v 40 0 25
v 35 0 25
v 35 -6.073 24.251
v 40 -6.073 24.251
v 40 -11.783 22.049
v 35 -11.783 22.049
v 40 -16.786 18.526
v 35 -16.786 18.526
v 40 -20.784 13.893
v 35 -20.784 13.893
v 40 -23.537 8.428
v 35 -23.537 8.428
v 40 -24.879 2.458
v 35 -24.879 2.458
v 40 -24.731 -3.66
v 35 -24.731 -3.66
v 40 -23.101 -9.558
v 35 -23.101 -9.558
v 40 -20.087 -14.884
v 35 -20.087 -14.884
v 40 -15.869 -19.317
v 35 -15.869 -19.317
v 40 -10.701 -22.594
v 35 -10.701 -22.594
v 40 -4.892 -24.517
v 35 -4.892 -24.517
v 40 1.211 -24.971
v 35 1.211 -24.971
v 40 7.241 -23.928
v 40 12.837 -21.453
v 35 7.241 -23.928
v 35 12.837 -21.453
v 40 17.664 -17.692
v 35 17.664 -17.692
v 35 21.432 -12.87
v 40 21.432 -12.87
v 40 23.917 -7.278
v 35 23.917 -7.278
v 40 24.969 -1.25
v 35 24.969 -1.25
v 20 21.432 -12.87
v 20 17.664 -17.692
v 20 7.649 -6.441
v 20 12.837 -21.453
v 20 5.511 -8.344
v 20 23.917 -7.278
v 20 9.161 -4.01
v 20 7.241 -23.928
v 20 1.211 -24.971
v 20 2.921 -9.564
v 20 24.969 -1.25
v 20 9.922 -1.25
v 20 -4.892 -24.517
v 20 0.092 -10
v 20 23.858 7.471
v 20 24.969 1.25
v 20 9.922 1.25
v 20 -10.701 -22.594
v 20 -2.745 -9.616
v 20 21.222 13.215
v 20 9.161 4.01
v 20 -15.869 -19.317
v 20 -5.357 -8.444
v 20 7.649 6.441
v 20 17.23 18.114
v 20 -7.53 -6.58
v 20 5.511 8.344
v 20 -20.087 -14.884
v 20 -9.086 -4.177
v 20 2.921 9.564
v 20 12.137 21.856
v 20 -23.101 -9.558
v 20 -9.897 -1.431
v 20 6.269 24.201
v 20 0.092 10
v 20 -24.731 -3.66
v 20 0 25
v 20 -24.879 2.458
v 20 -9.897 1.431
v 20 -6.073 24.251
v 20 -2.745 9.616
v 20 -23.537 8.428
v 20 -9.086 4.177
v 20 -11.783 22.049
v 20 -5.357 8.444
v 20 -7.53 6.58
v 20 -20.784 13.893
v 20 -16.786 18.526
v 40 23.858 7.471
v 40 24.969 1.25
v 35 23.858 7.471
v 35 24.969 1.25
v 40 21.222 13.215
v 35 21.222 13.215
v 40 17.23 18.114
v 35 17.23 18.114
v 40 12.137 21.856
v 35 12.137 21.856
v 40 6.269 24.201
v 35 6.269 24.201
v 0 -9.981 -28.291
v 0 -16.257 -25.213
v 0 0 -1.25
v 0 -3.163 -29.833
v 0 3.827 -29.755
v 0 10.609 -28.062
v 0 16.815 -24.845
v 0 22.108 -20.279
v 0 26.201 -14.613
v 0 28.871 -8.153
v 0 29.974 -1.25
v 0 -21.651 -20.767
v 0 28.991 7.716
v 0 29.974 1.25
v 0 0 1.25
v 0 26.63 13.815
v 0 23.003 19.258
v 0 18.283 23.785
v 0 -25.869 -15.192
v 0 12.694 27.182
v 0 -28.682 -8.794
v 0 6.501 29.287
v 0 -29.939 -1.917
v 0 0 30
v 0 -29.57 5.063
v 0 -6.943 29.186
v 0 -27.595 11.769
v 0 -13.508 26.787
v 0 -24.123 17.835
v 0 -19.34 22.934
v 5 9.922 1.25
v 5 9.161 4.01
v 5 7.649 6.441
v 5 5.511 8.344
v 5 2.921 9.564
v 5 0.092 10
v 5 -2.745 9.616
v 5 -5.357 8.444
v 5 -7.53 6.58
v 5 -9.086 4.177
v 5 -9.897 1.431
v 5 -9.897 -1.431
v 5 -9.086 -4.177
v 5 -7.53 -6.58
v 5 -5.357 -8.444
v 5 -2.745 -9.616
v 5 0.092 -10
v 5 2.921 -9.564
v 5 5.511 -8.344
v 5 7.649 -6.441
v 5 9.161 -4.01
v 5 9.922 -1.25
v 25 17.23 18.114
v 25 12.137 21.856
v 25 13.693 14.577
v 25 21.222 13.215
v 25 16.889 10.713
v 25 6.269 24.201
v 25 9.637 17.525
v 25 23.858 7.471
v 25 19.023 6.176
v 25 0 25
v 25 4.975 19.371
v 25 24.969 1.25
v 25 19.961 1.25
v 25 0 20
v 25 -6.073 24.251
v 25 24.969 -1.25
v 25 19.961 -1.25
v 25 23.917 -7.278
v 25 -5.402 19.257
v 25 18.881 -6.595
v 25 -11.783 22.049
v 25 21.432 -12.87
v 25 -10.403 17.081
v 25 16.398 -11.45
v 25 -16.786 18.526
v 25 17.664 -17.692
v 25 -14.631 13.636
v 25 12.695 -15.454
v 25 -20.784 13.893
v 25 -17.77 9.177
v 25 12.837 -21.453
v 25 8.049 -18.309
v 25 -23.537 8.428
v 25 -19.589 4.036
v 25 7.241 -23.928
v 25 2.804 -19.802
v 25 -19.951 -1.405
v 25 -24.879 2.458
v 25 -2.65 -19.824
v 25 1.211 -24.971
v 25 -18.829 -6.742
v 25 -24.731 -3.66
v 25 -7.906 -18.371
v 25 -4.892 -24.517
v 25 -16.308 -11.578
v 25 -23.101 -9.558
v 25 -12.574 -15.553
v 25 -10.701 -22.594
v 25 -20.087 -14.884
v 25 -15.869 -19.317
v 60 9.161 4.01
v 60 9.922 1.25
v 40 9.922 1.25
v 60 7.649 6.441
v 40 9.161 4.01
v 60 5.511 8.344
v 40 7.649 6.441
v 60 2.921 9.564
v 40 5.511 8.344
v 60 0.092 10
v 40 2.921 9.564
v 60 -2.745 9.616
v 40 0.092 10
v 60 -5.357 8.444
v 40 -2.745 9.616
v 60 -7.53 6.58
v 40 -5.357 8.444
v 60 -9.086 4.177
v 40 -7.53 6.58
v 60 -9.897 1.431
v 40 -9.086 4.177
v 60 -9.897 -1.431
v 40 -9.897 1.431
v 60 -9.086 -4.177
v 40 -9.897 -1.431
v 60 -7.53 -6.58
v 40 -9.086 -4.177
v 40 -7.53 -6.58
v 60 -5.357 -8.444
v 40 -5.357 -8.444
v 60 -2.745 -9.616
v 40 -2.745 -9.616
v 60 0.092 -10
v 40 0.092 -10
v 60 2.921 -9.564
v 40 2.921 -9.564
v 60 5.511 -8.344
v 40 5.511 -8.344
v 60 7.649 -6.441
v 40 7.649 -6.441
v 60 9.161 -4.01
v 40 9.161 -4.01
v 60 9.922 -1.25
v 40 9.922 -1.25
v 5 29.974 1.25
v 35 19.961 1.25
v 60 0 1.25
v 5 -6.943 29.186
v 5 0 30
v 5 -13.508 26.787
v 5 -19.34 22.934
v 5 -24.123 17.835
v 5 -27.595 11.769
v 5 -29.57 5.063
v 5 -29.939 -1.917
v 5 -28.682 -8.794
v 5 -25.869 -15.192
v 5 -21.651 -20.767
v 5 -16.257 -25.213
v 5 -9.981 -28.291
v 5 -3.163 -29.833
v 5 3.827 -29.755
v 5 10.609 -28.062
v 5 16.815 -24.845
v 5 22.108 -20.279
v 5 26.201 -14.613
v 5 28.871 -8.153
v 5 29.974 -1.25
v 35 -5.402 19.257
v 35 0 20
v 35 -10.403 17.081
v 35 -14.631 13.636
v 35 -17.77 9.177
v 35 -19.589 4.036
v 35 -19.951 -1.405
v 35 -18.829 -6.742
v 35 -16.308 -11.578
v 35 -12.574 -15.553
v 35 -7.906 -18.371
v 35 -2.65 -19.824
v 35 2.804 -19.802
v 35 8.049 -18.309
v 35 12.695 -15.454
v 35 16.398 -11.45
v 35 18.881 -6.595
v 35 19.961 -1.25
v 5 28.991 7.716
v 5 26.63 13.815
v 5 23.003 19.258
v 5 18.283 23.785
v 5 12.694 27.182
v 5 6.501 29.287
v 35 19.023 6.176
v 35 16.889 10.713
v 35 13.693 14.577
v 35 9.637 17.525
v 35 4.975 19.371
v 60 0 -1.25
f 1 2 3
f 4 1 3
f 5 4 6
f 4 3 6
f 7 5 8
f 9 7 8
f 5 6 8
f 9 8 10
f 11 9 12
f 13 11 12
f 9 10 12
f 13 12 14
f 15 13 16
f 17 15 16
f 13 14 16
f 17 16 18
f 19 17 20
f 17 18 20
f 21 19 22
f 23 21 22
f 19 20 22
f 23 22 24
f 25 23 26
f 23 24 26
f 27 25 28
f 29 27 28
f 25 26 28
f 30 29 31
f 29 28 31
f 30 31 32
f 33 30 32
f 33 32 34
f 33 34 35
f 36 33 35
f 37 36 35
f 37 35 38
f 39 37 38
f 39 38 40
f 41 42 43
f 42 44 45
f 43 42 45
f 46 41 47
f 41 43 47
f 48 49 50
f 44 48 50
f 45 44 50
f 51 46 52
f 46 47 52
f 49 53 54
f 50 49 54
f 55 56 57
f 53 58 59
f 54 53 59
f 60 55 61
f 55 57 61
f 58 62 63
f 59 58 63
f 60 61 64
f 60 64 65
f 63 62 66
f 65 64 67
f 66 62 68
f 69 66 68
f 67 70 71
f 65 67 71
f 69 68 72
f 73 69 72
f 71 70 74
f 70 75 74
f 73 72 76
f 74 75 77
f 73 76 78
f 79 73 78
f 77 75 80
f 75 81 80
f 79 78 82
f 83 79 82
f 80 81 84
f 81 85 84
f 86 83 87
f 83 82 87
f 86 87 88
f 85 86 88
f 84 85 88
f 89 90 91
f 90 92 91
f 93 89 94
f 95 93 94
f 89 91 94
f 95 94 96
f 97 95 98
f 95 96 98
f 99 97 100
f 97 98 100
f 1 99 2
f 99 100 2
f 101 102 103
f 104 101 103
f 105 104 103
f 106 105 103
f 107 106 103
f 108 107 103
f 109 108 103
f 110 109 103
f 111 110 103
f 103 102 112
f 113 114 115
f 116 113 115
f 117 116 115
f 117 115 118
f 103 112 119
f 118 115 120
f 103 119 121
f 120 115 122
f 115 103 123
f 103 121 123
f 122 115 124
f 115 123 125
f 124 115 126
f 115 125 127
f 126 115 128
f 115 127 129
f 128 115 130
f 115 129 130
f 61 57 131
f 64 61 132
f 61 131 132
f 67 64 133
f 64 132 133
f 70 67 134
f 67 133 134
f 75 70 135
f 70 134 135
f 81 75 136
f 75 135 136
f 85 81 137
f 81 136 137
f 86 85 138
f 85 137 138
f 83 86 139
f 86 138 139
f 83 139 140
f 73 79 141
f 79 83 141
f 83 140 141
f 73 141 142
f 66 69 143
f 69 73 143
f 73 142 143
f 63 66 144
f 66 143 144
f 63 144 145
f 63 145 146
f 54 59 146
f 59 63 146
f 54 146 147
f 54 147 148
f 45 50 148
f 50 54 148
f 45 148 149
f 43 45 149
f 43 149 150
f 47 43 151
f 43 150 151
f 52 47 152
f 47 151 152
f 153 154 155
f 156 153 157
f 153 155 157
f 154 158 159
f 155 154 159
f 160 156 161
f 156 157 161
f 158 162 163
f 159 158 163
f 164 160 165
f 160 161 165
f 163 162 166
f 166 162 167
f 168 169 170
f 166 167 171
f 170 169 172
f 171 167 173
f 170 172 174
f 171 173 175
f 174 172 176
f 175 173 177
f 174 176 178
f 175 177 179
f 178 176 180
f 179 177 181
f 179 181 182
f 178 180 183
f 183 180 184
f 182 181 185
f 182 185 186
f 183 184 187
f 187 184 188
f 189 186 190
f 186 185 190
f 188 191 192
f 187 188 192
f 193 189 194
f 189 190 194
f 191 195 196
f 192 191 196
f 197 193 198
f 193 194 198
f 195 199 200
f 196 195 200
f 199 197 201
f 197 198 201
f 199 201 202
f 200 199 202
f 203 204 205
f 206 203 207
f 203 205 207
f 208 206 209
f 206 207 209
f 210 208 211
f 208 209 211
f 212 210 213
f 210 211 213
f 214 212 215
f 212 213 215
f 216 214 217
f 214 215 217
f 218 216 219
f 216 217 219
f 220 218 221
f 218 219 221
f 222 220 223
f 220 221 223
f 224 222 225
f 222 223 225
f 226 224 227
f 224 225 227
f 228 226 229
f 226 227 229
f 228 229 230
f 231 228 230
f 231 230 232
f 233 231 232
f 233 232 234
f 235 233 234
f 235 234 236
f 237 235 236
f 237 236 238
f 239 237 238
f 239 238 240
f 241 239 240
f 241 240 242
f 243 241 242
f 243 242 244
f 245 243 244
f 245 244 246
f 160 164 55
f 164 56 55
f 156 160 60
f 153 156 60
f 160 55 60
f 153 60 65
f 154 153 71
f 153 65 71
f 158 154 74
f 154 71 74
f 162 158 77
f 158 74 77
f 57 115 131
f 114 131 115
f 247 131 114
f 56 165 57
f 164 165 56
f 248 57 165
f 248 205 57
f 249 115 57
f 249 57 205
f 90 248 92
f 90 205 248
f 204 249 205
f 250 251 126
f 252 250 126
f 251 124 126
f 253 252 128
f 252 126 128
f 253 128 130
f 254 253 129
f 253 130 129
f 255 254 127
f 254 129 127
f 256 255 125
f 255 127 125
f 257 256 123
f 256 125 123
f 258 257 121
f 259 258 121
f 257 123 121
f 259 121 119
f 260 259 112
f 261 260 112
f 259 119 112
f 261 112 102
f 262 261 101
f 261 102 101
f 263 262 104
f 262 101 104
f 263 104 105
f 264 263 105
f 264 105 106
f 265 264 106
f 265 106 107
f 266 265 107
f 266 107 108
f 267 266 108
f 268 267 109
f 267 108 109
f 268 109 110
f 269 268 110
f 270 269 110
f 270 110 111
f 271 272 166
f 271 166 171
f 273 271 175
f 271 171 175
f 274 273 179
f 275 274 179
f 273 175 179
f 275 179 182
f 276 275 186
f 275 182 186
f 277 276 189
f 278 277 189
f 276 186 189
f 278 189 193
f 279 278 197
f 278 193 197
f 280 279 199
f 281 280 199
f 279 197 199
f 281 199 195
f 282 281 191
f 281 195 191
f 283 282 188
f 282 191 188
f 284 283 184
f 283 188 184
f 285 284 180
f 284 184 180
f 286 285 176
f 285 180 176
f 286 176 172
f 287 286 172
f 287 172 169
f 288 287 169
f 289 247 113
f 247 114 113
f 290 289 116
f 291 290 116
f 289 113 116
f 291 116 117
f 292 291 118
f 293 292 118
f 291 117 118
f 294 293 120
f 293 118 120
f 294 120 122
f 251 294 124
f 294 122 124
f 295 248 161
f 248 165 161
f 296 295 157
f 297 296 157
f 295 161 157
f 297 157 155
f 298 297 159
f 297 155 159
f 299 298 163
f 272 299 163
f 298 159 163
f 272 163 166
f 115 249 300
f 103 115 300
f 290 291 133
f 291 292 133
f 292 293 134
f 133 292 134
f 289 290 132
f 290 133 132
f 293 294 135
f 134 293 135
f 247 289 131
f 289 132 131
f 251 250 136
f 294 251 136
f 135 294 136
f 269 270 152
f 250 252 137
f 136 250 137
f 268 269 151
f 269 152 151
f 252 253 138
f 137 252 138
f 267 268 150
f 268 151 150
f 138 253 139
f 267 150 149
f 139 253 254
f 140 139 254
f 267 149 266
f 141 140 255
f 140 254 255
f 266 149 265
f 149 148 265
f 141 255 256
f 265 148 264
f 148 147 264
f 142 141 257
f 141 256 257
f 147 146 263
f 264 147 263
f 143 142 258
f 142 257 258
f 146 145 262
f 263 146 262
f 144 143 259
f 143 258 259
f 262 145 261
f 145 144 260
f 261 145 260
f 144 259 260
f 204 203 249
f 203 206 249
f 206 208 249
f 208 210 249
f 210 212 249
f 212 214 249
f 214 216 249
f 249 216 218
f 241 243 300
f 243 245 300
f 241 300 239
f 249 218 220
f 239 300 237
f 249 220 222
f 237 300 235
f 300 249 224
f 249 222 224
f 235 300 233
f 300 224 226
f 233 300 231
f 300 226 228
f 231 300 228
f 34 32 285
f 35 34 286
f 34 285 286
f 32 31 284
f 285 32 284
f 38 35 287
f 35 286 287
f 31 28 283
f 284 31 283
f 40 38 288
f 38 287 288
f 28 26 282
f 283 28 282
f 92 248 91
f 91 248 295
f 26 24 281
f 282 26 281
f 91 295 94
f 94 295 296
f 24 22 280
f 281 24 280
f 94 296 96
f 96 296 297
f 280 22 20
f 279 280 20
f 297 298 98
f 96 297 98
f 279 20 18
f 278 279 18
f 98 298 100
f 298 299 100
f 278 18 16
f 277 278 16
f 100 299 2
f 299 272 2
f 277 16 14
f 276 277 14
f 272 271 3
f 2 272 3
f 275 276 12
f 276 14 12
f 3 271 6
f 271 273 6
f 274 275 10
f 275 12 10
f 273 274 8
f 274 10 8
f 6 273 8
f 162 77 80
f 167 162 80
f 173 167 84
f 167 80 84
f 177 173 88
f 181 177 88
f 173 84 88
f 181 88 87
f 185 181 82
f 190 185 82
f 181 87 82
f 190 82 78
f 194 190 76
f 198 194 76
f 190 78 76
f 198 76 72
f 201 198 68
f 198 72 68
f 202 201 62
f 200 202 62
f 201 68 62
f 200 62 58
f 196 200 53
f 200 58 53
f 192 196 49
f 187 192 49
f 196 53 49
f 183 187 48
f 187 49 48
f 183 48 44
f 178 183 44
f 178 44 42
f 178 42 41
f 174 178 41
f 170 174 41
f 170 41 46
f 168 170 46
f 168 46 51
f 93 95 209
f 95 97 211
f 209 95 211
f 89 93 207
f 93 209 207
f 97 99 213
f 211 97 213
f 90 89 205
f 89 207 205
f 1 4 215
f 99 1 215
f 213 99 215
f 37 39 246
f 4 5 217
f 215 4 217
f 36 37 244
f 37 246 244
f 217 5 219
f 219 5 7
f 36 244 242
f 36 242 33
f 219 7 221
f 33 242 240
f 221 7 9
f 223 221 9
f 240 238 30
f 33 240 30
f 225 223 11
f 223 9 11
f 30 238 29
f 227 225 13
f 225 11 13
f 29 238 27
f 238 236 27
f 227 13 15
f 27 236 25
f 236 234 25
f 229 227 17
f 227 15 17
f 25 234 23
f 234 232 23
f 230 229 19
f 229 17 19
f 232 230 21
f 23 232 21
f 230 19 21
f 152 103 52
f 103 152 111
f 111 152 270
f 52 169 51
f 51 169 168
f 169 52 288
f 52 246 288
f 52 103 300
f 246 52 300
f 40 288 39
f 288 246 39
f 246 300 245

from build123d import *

# Parameters (mm, degrees)
SKETCH2_W          = 2.5
SKETCH2_H          = 34.957041577
CUT_EXTRUDE1_DEPTH = 74.484692283


with BuildPart() as part:
    # Sketch1 → Revolve1 (revolve)
    with BuildSketch(Plane.XY, mode=Mode.PRIVATE) as revolve1_sk:
        Polygon((20, 10), (5, 10), (5, 30), (0, 30), (0, 0), (60, 0), (60, 10), (40, 10), (40, 25), (35, 25), (35, 20), (25, 20), (25, 25), (20, 25), align=None)
    revolve(revolve1_sk.sketch.rotate(Axis((0, 0, 0), (1, 0, 0)), 90), axis=Axis((0, 0, 0), (1, 0, 0)))

    # Sketch2 → Cut-Extrude1 (cut, through all)
    with BuildSketch(Plane(origin=(60, 0, 0), x_dir=(0, 0, -1), z_dir=(1, 0, 0))):
        with Locations((0, 17.478520789)):
            Rectangle(SKETCH2_W, SKETCH2_H)
    extrude(amount=-CUT_EXTRUDE1_DEPTH, mode=Mode.SUBTRACT)


solid = part.part
